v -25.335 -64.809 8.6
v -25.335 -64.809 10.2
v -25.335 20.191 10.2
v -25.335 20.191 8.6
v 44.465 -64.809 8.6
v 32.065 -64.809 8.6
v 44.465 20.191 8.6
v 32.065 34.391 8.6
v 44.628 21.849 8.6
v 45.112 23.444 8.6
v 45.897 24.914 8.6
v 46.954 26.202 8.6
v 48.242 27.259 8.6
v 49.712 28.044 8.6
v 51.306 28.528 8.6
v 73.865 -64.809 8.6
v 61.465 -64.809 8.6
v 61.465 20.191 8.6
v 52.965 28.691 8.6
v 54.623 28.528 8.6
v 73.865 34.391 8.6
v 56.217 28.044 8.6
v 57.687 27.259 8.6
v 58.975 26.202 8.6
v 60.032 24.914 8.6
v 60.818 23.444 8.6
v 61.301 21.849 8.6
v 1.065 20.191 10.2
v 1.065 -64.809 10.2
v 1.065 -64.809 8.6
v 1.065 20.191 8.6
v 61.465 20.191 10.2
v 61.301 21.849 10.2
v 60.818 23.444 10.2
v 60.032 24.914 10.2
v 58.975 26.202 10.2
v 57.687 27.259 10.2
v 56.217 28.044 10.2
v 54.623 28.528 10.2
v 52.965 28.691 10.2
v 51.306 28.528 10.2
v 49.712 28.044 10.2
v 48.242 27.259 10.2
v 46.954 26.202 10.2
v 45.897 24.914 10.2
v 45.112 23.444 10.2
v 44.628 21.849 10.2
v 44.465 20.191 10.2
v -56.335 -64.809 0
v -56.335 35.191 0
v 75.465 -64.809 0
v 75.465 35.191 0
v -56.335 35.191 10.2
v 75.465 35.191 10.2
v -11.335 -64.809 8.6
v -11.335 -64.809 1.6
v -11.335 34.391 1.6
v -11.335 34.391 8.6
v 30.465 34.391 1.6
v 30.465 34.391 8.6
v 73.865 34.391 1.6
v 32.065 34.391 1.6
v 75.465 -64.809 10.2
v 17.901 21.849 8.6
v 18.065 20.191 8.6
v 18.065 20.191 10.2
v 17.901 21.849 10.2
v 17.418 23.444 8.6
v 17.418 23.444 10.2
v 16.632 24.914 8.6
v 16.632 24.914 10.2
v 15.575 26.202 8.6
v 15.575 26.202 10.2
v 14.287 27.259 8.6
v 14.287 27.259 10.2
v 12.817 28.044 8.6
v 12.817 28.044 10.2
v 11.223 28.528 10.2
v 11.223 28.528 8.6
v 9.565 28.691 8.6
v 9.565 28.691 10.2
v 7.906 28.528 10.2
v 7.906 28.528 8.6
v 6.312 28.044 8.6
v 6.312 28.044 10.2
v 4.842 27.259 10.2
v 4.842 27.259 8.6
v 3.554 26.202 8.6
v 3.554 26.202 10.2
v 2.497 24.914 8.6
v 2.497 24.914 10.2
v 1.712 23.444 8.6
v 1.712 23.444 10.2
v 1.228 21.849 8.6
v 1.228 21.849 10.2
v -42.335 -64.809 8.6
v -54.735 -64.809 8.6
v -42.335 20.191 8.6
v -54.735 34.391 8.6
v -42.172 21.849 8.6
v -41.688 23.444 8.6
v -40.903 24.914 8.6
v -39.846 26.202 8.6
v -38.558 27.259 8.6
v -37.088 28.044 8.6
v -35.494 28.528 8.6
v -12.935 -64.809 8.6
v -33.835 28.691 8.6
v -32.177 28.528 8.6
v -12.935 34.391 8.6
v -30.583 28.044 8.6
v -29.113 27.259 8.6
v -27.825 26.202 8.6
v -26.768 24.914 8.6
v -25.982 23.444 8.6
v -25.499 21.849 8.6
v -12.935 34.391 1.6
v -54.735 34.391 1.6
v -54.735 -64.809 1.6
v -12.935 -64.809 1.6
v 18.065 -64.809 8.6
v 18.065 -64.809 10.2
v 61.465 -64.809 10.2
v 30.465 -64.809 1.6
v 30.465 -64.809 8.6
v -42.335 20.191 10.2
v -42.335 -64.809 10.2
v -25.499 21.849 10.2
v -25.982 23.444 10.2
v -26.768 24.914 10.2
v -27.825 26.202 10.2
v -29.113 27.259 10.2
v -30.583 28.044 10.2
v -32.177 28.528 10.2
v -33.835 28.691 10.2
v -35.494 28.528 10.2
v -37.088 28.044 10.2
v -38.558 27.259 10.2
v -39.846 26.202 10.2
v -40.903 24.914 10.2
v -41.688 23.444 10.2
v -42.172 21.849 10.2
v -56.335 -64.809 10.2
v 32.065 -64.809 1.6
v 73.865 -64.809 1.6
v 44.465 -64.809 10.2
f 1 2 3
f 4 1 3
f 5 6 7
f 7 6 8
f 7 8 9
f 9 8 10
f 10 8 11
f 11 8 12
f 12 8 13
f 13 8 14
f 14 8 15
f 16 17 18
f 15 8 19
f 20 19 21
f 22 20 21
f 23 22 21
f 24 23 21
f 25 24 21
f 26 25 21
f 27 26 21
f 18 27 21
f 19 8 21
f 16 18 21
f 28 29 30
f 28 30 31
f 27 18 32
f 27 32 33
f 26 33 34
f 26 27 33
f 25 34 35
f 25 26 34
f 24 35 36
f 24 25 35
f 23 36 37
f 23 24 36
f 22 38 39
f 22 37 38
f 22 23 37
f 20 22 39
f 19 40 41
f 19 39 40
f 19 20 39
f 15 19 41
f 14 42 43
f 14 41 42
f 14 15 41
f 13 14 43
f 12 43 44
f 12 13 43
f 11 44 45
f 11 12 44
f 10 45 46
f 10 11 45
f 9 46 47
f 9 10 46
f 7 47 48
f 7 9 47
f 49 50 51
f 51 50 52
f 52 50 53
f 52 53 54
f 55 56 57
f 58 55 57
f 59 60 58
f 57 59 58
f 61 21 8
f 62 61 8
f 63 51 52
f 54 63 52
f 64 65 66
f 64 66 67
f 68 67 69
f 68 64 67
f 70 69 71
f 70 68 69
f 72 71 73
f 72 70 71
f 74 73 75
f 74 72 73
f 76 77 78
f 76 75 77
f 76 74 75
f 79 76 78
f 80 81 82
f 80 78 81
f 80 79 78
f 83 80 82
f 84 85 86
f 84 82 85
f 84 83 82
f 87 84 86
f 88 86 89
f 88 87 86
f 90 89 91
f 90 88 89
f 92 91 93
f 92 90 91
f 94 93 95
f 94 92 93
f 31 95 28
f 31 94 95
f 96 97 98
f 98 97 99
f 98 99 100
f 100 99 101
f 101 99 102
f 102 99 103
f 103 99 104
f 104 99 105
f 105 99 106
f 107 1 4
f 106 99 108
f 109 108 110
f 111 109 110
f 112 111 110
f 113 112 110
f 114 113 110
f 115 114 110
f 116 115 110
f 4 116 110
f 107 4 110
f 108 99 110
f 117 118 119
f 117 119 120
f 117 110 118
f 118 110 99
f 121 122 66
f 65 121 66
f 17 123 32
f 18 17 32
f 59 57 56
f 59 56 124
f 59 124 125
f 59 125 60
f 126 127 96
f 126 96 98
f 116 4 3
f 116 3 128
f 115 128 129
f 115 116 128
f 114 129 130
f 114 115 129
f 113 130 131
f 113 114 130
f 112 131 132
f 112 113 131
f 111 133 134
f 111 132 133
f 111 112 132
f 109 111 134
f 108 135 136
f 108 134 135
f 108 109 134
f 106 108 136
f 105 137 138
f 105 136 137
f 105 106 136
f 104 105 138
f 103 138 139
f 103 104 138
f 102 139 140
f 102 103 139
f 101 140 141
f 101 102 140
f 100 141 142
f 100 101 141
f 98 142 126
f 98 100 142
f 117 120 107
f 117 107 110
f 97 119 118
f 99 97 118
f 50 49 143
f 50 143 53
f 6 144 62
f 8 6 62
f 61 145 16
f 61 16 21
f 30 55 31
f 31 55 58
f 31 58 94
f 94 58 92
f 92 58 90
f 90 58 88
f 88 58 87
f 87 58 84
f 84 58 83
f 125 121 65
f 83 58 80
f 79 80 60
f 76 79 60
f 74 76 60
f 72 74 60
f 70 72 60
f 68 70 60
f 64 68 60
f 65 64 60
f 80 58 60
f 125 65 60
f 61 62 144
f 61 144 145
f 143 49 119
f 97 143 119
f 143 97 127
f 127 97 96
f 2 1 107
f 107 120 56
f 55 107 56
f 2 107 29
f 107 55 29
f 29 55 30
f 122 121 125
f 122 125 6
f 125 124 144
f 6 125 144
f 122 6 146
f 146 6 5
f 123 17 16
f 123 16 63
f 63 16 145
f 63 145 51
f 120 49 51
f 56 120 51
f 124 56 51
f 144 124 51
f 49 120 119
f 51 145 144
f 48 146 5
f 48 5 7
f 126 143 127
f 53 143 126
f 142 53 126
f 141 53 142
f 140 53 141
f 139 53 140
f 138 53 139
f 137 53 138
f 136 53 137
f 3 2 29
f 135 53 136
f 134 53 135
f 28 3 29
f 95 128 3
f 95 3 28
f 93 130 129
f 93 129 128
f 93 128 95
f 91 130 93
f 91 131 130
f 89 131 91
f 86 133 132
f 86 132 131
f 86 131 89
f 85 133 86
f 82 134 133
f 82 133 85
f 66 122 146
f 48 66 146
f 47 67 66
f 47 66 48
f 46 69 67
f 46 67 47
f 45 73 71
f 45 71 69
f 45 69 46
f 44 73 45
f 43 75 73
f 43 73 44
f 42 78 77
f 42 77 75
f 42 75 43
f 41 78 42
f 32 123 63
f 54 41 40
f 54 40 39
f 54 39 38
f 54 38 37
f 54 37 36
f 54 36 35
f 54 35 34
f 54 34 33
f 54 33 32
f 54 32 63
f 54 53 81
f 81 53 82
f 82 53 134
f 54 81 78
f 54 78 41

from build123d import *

# Parameters (mm, degrees)
F0_W      = 45
F0_H      = 100
F1_DEPTH  = 10.2
F2_W      = 17
F2_H      = 85
F3_DEPTH  = 8.6
F4_W      = 41.8
F4_H      = 100
F5_DEPTH  = 7
F8_R      = 8.5
F9_DEPTH  = 10
F14_W     = 131.8
F14_H     = 10.2
F15_DEPTH = 0.8


with BuildPart() as f1:
    # F0 (on Top) → F1 (new body)
    with BuildSketch(Plane.XY):
        with Locations((-33.8353561237, -14.8088461805)):
            Rectangle(F0_W, F0_H)
    extrude(amount=F1_DEPTH)

    # F2 (on face) → F3 (cut)
    with BuildSketch(Plane.XY.offset(10.2)):
        with Locations((-33.8353561237, -22.3088461805)):
            Rectangle(F2_W, F2_H)
    extrude(amount=-F3_DEPTH, mode=Mode.SUBTRACT)


with BuildPart() as f5:
    # F4 (on Top) → F5 (new body)
    with BuildSketch(Plane.XY):
        with Locations((-35.4353561237, -14.8088461805)):
            Rectangle(F4_W, F4_H)
    extrude(amount=F5_DEPTH)


with BuildPart() as f5_1:
    # F6: moved
    add(f5.part.moved(Location((1.6, 0, 1.6))))


with BuildPart() as f1_1:
    add(f1.part)

    # F7: cut F5
    add(f5_1.part, mode=Mode.SUBTRACT)


with BuildPart() as f9:
    # F8 (on Top) → F9 (new body)
    with BuildSketch(Plane.XY):
        with Locations((-33.8353561237, -64.8088461805)):
            Circle(F8_R)
    extrude(amount=F9_DEPTH)


with BuildPart() as f9_1:
    # F10: moved
    add(f9.part.moved(Location((0, 85, 4))))


with BuildPart() as f1_2:
    add(f1_1.part)

    # F11: cut F9
    add(f9_1.part, mode=Mode.SUBTRACT)


with BuildPart() as f12_1:
    # F12: copy of F1
    add(f1_2.part.moved(Location((43.4, 0, 0))))


with BuildPart() as f13_1:
    # F13: copy of F12_1
    add(f12_1.part.moved(Location((43.4, 0, 0))))


with BuildPart() as f1_3:
    add(f1_2.part)

    add(f12_1.part)  # F15 merges F12_1

    add(f13_1.part)  # F15 merges F13_1
    # F14 (on face) → F15 (join)
    with BuildSketch(Plane(origin=(0, 35.1911538195, 0), x_dir=(-1, 0, 0), z_dir=(0, 1, 0))):
        with Locations((-9.5646438763, 5.1)):
            Rectangle(F14_W, F14_H)
    extrude(amount=-F15_DEPTH)


solid = f1_3.part
